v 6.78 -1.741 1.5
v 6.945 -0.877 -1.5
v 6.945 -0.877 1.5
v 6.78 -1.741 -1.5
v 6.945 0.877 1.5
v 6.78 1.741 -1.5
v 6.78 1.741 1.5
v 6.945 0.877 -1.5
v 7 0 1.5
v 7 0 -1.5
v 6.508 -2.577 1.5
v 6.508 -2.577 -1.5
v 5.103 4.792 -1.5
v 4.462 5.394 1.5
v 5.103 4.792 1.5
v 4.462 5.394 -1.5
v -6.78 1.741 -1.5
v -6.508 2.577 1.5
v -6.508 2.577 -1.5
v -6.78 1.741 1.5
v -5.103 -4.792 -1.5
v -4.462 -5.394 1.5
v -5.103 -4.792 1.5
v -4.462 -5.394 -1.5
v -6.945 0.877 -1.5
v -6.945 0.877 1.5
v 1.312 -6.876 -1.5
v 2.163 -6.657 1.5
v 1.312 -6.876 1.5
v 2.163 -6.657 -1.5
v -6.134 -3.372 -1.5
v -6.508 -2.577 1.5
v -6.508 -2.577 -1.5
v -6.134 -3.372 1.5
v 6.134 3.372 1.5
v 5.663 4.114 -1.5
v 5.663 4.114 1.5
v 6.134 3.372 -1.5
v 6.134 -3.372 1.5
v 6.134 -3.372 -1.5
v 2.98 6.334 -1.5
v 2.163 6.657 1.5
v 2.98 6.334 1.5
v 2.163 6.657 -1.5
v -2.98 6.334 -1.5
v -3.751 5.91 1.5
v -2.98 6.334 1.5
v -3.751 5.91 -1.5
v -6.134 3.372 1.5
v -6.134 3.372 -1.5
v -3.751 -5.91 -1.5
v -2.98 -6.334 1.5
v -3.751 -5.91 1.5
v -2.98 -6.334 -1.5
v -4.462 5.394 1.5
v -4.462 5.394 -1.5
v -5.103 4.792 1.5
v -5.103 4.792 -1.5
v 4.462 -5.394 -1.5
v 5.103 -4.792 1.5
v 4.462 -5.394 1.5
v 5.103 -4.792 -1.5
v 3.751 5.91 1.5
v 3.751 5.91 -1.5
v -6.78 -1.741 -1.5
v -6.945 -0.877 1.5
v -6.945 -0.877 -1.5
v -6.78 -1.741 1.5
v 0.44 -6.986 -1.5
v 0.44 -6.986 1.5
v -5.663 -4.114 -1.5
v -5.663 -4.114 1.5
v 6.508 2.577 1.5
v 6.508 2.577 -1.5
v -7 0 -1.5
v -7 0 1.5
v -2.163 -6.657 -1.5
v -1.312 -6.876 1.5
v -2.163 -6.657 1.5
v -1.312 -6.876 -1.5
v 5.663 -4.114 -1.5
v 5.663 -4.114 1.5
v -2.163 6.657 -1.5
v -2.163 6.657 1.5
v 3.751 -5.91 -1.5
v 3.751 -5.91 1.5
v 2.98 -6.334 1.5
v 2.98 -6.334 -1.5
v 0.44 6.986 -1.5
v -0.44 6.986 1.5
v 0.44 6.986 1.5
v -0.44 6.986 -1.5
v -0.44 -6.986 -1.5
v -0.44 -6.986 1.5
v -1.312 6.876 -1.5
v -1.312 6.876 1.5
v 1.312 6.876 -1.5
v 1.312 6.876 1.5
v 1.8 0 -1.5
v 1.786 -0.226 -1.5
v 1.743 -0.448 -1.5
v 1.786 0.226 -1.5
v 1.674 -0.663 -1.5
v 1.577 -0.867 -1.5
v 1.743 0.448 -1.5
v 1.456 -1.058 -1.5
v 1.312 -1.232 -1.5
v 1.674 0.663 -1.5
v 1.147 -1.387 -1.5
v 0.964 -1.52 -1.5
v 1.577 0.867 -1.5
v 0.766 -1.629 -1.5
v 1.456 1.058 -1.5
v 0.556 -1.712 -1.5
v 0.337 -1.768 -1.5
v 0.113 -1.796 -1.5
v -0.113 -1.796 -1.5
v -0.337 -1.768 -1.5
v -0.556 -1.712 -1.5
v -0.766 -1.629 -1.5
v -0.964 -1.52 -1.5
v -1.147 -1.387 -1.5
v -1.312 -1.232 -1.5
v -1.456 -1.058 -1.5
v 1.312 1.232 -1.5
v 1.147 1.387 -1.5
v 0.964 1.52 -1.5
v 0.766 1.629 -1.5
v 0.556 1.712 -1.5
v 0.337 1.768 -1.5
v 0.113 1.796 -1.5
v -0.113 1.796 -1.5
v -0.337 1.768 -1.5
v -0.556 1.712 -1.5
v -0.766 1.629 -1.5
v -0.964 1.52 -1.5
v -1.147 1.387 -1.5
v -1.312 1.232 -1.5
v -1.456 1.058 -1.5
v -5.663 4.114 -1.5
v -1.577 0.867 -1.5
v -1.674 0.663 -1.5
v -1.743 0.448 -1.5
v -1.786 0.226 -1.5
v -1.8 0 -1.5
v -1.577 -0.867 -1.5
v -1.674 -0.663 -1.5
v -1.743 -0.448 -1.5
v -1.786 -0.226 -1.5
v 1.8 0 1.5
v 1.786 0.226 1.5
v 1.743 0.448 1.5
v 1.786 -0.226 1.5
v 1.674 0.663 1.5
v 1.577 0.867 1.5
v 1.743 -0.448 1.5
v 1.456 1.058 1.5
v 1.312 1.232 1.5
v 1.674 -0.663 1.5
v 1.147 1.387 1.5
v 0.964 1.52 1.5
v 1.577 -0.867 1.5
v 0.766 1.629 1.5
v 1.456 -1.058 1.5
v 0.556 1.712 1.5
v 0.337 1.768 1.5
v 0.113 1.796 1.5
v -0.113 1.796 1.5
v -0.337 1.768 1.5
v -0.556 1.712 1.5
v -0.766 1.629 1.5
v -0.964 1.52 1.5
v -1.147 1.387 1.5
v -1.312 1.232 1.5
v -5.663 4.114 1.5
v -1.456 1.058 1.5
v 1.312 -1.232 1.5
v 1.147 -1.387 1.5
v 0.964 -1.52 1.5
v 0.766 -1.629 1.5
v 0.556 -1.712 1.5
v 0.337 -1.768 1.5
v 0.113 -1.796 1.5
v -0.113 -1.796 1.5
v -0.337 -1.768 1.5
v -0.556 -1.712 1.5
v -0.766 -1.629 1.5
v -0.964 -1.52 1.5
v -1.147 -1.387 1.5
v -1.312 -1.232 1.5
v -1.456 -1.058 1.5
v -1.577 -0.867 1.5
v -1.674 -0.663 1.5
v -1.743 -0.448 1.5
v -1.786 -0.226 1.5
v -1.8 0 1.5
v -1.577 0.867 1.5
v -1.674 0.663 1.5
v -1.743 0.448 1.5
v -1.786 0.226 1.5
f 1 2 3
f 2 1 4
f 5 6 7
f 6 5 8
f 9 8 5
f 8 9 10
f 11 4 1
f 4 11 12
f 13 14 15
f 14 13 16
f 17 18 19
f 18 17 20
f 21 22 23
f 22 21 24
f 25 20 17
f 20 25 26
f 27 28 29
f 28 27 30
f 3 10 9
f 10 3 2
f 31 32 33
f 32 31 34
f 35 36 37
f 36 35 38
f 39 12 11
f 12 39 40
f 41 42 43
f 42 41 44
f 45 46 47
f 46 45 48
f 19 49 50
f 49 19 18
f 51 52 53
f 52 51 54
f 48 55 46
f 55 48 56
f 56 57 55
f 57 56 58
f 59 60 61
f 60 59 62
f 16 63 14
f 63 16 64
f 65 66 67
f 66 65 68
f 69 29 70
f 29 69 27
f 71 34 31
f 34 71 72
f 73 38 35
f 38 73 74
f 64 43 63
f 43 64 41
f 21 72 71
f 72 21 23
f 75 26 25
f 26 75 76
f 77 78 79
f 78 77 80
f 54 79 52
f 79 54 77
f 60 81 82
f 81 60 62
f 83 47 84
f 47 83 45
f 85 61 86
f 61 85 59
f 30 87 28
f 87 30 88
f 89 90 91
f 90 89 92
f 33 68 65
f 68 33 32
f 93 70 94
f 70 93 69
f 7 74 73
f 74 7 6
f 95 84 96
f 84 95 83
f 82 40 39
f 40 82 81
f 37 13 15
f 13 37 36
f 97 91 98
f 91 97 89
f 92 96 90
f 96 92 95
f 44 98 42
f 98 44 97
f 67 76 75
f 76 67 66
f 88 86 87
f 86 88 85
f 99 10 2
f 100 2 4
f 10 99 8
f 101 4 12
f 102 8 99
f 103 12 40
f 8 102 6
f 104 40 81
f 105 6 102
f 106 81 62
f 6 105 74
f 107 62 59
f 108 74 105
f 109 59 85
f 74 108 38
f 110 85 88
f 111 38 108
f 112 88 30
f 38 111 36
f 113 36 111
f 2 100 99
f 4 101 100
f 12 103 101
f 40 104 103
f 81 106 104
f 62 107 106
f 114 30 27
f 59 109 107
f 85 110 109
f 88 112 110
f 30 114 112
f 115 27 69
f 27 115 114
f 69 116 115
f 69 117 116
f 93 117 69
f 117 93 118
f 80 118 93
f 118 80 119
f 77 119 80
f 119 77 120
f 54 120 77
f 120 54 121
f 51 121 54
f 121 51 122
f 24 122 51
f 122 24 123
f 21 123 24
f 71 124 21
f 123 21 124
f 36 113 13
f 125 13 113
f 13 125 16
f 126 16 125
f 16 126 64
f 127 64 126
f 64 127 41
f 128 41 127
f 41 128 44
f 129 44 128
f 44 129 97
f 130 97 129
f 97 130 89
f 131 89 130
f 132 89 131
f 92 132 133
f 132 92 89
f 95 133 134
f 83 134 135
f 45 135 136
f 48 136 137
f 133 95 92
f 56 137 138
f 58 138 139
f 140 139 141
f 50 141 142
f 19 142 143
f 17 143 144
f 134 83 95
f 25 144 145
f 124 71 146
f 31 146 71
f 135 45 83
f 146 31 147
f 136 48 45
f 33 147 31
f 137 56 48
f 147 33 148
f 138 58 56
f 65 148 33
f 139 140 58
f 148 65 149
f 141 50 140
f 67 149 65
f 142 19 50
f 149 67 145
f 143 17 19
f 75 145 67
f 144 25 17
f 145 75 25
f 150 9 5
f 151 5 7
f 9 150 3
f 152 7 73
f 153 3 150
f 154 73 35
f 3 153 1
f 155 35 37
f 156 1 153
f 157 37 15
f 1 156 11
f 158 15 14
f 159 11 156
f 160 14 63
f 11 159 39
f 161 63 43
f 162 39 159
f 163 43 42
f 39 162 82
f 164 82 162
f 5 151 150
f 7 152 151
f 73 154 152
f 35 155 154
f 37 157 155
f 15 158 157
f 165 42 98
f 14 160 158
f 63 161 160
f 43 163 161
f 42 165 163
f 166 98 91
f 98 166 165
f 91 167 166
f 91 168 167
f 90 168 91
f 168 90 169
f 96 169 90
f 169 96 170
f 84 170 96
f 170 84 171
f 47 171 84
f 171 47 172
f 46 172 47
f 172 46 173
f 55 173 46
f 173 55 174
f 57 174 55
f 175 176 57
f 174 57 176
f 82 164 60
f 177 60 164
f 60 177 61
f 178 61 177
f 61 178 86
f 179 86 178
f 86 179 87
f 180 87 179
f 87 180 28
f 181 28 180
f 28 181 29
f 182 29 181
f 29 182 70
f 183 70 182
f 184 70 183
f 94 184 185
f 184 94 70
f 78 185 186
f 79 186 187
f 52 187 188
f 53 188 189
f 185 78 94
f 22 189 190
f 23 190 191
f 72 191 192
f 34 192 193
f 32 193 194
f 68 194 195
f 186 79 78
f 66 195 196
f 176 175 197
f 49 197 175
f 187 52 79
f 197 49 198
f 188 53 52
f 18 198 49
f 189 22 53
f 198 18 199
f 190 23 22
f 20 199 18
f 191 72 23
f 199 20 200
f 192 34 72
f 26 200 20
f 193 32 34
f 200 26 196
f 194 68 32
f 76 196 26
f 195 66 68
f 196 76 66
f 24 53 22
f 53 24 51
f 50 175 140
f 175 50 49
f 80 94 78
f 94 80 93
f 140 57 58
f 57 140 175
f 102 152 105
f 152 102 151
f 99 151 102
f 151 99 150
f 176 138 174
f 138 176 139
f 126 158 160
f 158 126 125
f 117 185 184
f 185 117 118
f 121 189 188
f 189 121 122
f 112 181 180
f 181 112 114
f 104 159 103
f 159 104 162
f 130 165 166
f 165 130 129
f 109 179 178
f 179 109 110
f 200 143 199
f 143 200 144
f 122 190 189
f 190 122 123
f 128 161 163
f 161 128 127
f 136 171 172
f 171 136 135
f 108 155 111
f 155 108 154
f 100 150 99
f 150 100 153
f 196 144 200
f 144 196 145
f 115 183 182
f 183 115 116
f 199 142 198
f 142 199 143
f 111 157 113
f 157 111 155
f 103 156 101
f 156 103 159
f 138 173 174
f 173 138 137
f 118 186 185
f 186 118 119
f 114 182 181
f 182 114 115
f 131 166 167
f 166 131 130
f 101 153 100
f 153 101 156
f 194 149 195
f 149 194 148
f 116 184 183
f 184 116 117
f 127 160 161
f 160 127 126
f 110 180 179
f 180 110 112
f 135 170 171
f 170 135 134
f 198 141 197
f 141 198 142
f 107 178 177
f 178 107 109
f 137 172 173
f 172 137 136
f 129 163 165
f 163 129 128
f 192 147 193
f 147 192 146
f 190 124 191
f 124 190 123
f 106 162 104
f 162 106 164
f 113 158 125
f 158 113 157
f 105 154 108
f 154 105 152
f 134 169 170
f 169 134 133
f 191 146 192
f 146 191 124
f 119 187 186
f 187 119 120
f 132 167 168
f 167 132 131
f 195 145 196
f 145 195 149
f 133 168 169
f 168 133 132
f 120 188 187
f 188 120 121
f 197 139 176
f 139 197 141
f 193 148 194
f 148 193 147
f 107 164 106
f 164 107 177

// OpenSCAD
$fn = 50;


difference() {
	union() {
		translate(v = [0, 0, -1.5000000000]) {
			cylinder(h = 3, r = 7.0000000000);
		}
		translate(v = [0, 0, -1.5000000000]) {
			cylinder(h = 3, r = 2.8500000000);
		}
	}
	union() {
		translate(v = [0, 0, -50.0000000000]) {
			cylinder(h = 100, r = 1.8000000000);
		}
	}
}
